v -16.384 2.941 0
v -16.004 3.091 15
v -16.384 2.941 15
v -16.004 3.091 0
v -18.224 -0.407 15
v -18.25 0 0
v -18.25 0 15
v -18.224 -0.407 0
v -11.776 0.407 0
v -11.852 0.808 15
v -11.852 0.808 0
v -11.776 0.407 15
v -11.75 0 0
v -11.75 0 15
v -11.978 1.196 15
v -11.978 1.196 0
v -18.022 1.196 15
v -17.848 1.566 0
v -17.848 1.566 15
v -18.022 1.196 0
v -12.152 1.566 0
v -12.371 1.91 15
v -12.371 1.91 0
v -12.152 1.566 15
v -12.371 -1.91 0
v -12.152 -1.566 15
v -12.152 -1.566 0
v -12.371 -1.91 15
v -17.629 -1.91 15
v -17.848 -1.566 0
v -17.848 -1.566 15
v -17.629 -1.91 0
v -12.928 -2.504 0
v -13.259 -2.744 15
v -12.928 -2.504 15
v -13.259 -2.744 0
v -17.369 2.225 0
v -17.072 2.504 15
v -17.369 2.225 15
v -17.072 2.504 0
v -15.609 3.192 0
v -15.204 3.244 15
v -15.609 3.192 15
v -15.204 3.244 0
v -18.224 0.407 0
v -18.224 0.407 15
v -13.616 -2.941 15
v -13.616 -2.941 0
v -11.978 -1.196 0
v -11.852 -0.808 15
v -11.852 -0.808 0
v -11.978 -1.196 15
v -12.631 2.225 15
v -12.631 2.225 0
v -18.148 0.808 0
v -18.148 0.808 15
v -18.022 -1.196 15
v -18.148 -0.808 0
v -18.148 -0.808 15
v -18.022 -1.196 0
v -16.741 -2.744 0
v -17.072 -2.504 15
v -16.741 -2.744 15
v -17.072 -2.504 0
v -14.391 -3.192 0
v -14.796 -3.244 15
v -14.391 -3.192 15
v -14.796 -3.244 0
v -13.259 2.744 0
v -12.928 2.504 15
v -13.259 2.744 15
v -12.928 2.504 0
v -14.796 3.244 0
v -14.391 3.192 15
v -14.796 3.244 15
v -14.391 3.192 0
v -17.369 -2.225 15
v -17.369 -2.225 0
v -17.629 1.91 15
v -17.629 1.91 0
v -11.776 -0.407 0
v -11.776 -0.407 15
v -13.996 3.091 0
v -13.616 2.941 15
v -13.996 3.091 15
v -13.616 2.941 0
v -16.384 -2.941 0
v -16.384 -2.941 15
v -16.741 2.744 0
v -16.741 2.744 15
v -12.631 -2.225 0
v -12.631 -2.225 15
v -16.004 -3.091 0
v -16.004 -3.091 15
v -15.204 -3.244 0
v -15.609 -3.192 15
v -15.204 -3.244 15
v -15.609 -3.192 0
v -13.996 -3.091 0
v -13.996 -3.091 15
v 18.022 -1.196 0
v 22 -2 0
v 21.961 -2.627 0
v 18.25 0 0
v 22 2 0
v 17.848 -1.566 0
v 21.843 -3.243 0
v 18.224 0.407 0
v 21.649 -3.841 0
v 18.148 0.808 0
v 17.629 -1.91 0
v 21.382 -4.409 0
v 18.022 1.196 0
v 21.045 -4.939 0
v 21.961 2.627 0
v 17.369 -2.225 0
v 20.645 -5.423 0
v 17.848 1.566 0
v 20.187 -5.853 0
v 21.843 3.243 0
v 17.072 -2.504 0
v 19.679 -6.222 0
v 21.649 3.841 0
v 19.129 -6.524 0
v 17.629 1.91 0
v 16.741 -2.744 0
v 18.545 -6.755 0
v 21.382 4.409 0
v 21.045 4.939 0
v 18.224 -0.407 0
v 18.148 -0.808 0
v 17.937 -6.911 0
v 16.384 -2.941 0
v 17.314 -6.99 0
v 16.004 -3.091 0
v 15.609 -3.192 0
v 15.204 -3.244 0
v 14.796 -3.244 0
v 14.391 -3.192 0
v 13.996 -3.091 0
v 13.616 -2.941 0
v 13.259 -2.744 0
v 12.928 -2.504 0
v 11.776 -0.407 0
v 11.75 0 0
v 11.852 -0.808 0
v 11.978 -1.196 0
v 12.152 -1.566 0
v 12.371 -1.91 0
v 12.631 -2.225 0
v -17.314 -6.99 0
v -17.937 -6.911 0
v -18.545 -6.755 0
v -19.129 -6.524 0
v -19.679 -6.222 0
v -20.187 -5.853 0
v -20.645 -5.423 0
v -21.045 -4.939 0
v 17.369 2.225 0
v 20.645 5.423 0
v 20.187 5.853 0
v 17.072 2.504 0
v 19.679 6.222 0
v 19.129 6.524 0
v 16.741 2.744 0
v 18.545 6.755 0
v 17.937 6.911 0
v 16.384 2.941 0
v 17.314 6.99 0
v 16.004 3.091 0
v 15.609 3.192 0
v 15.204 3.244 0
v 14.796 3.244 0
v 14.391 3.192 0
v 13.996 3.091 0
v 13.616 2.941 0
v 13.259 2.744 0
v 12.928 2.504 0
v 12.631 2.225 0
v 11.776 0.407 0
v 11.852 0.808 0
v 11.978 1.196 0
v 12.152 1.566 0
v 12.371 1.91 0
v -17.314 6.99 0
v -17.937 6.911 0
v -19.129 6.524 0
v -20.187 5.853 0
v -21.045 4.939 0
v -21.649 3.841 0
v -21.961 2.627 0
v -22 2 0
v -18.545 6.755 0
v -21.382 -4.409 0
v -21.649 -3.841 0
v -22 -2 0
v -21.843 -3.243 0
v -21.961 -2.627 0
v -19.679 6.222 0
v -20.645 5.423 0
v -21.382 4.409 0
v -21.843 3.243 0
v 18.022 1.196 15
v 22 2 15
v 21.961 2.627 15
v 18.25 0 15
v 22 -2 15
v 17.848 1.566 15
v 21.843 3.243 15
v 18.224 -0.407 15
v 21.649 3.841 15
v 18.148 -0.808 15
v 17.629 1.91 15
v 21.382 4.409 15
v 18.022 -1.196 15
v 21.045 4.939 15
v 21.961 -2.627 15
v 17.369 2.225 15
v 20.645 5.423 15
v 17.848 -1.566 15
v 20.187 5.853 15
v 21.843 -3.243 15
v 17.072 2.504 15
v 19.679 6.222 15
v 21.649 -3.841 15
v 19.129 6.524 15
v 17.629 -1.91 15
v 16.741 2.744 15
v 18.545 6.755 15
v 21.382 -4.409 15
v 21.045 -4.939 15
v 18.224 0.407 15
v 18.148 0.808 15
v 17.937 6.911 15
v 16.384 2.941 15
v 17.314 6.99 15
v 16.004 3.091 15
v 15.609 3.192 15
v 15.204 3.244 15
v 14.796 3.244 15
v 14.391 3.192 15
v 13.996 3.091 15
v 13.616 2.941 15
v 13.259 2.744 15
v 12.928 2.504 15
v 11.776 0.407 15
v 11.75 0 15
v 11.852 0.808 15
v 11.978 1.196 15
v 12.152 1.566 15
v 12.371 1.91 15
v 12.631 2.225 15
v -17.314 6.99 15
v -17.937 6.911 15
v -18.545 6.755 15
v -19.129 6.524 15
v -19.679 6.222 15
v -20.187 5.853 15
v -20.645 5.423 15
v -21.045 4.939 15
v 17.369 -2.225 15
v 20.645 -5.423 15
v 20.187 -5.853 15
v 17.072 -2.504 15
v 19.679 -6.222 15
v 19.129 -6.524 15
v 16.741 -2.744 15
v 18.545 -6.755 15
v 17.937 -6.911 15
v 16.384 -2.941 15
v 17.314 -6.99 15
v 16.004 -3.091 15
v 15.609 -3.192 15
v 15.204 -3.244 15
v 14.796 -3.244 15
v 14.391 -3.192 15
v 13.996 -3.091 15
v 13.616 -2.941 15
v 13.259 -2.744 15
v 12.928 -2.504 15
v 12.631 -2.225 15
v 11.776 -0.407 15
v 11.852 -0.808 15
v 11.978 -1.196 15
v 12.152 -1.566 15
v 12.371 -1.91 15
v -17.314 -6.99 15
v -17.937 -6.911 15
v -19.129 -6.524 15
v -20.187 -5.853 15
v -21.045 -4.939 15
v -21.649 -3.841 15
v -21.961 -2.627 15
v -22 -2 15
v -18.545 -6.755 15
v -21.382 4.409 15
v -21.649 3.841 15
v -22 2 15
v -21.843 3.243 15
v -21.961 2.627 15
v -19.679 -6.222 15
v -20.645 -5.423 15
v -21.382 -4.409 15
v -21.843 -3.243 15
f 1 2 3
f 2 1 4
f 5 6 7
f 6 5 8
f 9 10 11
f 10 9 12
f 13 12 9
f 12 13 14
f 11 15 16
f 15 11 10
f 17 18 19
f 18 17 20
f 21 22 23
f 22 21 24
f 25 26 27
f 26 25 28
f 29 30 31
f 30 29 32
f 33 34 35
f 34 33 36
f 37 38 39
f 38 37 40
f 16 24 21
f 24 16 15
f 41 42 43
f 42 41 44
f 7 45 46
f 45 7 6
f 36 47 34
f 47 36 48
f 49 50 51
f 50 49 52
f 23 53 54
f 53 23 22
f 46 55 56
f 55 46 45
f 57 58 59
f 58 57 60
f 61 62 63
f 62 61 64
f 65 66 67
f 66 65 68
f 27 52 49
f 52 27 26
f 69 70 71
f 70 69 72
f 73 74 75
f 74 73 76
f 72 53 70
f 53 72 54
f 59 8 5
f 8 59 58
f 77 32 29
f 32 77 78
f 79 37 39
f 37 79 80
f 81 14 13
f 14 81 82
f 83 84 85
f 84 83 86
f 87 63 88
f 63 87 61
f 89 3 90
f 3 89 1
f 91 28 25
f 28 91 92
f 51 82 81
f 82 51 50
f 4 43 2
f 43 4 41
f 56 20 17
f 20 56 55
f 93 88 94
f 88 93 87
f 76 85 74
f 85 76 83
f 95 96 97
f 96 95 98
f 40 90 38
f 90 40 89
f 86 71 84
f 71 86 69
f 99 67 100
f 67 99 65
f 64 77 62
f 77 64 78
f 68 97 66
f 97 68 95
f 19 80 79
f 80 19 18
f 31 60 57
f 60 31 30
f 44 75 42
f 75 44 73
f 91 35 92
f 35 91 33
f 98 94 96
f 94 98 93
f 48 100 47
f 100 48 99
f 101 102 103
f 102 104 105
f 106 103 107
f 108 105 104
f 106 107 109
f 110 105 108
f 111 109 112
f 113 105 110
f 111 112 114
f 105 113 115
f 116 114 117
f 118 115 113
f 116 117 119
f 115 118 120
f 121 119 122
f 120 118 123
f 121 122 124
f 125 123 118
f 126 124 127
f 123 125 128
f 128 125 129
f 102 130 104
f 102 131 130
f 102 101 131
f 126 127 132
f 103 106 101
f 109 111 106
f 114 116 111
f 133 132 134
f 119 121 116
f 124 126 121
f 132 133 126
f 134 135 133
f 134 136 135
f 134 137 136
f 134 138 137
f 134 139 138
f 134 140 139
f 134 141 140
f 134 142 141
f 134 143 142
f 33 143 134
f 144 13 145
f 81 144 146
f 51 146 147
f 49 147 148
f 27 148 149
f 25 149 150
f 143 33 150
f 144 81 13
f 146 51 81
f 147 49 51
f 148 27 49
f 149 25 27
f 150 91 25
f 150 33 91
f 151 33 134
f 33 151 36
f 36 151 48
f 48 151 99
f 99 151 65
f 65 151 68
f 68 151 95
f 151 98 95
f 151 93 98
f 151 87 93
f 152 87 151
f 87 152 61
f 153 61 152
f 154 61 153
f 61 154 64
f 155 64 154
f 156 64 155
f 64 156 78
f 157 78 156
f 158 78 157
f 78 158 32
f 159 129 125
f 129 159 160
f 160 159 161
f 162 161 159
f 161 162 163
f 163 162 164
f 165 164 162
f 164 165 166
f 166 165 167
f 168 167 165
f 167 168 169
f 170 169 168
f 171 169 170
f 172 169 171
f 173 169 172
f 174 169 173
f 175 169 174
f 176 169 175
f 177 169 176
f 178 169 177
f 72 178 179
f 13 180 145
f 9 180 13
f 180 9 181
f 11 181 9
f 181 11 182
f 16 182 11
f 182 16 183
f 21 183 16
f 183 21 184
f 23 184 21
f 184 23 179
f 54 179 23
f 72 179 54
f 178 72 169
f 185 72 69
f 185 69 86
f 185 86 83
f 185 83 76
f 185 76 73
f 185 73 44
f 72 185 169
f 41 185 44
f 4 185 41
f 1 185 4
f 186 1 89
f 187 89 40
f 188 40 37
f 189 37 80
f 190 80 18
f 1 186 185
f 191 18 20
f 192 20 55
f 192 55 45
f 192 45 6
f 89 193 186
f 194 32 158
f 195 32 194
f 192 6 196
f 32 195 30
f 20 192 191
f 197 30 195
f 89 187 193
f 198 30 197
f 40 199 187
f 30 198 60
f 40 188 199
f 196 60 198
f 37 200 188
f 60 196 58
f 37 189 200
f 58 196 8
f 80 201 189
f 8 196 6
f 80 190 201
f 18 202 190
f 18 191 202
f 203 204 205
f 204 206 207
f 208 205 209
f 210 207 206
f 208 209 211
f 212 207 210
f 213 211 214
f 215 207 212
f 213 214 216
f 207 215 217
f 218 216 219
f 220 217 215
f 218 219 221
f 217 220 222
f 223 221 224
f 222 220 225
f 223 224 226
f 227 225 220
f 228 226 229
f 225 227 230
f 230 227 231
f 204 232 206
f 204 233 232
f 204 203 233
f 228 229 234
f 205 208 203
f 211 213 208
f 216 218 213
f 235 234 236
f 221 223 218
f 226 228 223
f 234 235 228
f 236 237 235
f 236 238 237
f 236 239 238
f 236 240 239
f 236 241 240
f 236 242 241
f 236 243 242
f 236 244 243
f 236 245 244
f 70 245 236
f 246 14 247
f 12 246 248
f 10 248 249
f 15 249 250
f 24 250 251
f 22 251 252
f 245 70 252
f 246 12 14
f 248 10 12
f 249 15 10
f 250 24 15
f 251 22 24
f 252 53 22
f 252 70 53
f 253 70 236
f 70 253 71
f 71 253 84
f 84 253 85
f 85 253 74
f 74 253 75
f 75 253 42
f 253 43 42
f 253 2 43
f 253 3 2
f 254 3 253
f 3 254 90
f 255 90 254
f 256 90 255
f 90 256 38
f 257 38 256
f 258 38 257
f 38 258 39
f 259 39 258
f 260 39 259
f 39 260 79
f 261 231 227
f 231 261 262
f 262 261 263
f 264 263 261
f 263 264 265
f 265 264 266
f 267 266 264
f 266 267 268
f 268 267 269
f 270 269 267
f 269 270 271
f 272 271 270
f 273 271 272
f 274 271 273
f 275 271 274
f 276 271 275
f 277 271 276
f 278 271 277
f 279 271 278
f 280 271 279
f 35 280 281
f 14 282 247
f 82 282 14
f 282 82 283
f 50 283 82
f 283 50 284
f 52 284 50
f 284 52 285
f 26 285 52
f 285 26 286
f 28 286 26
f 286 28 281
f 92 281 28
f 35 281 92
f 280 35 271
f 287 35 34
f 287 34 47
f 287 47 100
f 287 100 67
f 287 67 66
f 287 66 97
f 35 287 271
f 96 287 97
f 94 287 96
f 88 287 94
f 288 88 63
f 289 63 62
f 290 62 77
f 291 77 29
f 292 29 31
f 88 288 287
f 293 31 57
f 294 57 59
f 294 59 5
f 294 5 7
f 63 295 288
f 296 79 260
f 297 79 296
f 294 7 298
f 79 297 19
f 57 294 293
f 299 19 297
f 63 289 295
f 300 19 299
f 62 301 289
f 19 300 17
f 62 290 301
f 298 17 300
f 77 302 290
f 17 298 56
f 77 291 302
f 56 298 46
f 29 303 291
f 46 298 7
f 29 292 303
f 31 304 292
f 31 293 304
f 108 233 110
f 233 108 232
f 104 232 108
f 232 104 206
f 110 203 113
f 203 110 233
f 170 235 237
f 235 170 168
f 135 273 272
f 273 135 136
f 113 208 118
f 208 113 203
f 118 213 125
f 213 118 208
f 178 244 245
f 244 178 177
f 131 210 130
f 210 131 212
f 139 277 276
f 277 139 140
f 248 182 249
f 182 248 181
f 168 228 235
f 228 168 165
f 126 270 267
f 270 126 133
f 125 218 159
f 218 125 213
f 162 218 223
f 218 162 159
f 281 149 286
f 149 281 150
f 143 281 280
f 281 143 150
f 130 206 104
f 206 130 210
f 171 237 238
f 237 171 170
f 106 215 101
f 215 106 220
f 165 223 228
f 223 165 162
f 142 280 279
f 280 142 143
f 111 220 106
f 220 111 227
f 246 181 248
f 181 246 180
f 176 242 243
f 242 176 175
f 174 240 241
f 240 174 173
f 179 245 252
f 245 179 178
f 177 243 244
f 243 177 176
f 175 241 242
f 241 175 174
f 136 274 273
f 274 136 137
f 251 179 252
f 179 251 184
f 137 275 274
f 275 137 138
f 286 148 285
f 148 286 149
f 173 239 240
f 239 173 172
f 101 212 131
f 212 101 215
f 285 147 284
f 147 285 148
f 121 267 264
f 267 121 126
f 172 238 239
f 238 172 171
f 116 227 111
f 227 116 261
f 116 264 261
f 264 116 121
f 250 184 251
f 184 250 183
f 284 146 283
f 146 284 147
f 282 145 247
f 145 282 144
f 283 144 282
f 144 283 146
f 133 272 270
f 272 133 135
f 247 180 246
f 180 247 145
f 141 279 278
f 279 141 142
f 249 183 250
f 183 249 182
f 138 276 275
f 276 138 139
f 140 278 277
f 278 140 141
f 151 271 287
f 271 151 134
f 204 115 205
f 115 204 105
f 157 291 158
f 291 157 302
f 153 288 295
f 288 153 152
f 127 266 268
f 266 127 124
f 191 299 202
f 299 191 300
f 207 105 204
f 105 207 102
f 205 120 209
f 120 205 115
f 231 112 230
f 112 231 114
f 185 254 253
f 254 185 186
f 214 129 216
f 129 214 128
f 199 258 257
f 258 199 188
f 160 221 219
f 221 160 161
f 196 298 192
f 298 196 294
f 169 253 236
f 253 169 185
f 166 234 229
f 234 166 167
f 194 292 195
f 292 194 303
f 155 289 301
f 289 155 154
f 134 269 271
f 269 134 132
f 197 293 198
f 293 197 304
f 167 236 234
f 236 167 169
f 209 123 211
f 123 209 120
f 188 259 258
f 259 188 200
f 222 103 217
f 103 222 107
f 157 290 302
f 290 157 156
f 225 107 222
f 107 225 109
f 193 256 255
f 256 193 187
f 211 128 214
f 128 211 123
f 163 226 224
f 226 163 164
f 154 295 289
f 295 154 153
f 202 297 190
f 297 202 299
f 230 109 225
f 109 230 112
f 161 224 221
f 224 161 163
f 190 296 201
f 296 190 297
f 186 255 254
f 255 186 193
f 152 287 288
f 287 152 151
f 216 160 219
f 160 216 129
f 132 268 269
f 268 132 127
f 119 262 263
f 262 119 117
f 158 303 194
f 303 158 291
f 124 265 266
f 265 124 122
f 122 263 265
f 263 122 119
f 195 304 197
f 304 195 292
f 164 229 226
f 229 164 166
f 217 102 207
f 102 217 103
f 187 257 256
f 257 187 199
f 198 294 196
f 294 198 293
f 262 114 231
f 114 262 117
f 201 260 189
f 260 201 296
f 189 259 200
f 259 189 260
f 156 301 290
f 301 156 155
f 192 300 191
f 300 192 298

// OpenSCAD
$fn = 50;


difference() {
	union() {
		hull() {
			translate(v = [-17.0000000000, 2.0000000000, 0]) {
				cylinder(h = 15, r = 5);
			}
			translate(v = [17.0000000000, 2.0000000000, 0]) {
				cylinder(h = 15, r = 5);
			}
			translate(v = [-17.0000000000, -2.0000000000, 0]) {
				cylinder(h = 15, r = 5);
			}
			translate(v = [17.0000000000, -2.0000000000, 0]) {
				cylinder(h = 15, r = 5);
			}
		}
	}
	union() {
		translate(v = [-15.0000000000, 0.0000000000, 0]) {
			cylinder(h = 15, r = 3.2500000000);
		}
		translate(v = [15.0000000000, 0.0000000000, 0]) {
			cylinder(h = 15, r = 3.2500000000);
		}
		translate(v = [-15.0000000000, 0.0000000000, 0]) {
			cylinder(h = 15, r = 1.8000000000);
		}
		translate(v = [15.0000000000, 0.0000000000, 0]) {
			cylinder(h = 15, r = 1.8000000000);
		}
		translate(v = [-15.0000000000, 0.0000000000, 0]) {
			cylinder(h = 15, r = 1.8000000000);
		}
		translate(v = [15.0000000000, 0.0000000000, 0]) {
			cylinder(h = 15, r = 1.8000000000);
		}
		translate(v = [-15.0000000000, 0.0000000000, 0]) {
			cylinder(h = 15, r = 1.8000000000);
		}
		translate(v = [15.0000000000, 0.0000000000, 0]) {
			cylinder(h = 15, r = 1.8000000000);
		}
	}
}
